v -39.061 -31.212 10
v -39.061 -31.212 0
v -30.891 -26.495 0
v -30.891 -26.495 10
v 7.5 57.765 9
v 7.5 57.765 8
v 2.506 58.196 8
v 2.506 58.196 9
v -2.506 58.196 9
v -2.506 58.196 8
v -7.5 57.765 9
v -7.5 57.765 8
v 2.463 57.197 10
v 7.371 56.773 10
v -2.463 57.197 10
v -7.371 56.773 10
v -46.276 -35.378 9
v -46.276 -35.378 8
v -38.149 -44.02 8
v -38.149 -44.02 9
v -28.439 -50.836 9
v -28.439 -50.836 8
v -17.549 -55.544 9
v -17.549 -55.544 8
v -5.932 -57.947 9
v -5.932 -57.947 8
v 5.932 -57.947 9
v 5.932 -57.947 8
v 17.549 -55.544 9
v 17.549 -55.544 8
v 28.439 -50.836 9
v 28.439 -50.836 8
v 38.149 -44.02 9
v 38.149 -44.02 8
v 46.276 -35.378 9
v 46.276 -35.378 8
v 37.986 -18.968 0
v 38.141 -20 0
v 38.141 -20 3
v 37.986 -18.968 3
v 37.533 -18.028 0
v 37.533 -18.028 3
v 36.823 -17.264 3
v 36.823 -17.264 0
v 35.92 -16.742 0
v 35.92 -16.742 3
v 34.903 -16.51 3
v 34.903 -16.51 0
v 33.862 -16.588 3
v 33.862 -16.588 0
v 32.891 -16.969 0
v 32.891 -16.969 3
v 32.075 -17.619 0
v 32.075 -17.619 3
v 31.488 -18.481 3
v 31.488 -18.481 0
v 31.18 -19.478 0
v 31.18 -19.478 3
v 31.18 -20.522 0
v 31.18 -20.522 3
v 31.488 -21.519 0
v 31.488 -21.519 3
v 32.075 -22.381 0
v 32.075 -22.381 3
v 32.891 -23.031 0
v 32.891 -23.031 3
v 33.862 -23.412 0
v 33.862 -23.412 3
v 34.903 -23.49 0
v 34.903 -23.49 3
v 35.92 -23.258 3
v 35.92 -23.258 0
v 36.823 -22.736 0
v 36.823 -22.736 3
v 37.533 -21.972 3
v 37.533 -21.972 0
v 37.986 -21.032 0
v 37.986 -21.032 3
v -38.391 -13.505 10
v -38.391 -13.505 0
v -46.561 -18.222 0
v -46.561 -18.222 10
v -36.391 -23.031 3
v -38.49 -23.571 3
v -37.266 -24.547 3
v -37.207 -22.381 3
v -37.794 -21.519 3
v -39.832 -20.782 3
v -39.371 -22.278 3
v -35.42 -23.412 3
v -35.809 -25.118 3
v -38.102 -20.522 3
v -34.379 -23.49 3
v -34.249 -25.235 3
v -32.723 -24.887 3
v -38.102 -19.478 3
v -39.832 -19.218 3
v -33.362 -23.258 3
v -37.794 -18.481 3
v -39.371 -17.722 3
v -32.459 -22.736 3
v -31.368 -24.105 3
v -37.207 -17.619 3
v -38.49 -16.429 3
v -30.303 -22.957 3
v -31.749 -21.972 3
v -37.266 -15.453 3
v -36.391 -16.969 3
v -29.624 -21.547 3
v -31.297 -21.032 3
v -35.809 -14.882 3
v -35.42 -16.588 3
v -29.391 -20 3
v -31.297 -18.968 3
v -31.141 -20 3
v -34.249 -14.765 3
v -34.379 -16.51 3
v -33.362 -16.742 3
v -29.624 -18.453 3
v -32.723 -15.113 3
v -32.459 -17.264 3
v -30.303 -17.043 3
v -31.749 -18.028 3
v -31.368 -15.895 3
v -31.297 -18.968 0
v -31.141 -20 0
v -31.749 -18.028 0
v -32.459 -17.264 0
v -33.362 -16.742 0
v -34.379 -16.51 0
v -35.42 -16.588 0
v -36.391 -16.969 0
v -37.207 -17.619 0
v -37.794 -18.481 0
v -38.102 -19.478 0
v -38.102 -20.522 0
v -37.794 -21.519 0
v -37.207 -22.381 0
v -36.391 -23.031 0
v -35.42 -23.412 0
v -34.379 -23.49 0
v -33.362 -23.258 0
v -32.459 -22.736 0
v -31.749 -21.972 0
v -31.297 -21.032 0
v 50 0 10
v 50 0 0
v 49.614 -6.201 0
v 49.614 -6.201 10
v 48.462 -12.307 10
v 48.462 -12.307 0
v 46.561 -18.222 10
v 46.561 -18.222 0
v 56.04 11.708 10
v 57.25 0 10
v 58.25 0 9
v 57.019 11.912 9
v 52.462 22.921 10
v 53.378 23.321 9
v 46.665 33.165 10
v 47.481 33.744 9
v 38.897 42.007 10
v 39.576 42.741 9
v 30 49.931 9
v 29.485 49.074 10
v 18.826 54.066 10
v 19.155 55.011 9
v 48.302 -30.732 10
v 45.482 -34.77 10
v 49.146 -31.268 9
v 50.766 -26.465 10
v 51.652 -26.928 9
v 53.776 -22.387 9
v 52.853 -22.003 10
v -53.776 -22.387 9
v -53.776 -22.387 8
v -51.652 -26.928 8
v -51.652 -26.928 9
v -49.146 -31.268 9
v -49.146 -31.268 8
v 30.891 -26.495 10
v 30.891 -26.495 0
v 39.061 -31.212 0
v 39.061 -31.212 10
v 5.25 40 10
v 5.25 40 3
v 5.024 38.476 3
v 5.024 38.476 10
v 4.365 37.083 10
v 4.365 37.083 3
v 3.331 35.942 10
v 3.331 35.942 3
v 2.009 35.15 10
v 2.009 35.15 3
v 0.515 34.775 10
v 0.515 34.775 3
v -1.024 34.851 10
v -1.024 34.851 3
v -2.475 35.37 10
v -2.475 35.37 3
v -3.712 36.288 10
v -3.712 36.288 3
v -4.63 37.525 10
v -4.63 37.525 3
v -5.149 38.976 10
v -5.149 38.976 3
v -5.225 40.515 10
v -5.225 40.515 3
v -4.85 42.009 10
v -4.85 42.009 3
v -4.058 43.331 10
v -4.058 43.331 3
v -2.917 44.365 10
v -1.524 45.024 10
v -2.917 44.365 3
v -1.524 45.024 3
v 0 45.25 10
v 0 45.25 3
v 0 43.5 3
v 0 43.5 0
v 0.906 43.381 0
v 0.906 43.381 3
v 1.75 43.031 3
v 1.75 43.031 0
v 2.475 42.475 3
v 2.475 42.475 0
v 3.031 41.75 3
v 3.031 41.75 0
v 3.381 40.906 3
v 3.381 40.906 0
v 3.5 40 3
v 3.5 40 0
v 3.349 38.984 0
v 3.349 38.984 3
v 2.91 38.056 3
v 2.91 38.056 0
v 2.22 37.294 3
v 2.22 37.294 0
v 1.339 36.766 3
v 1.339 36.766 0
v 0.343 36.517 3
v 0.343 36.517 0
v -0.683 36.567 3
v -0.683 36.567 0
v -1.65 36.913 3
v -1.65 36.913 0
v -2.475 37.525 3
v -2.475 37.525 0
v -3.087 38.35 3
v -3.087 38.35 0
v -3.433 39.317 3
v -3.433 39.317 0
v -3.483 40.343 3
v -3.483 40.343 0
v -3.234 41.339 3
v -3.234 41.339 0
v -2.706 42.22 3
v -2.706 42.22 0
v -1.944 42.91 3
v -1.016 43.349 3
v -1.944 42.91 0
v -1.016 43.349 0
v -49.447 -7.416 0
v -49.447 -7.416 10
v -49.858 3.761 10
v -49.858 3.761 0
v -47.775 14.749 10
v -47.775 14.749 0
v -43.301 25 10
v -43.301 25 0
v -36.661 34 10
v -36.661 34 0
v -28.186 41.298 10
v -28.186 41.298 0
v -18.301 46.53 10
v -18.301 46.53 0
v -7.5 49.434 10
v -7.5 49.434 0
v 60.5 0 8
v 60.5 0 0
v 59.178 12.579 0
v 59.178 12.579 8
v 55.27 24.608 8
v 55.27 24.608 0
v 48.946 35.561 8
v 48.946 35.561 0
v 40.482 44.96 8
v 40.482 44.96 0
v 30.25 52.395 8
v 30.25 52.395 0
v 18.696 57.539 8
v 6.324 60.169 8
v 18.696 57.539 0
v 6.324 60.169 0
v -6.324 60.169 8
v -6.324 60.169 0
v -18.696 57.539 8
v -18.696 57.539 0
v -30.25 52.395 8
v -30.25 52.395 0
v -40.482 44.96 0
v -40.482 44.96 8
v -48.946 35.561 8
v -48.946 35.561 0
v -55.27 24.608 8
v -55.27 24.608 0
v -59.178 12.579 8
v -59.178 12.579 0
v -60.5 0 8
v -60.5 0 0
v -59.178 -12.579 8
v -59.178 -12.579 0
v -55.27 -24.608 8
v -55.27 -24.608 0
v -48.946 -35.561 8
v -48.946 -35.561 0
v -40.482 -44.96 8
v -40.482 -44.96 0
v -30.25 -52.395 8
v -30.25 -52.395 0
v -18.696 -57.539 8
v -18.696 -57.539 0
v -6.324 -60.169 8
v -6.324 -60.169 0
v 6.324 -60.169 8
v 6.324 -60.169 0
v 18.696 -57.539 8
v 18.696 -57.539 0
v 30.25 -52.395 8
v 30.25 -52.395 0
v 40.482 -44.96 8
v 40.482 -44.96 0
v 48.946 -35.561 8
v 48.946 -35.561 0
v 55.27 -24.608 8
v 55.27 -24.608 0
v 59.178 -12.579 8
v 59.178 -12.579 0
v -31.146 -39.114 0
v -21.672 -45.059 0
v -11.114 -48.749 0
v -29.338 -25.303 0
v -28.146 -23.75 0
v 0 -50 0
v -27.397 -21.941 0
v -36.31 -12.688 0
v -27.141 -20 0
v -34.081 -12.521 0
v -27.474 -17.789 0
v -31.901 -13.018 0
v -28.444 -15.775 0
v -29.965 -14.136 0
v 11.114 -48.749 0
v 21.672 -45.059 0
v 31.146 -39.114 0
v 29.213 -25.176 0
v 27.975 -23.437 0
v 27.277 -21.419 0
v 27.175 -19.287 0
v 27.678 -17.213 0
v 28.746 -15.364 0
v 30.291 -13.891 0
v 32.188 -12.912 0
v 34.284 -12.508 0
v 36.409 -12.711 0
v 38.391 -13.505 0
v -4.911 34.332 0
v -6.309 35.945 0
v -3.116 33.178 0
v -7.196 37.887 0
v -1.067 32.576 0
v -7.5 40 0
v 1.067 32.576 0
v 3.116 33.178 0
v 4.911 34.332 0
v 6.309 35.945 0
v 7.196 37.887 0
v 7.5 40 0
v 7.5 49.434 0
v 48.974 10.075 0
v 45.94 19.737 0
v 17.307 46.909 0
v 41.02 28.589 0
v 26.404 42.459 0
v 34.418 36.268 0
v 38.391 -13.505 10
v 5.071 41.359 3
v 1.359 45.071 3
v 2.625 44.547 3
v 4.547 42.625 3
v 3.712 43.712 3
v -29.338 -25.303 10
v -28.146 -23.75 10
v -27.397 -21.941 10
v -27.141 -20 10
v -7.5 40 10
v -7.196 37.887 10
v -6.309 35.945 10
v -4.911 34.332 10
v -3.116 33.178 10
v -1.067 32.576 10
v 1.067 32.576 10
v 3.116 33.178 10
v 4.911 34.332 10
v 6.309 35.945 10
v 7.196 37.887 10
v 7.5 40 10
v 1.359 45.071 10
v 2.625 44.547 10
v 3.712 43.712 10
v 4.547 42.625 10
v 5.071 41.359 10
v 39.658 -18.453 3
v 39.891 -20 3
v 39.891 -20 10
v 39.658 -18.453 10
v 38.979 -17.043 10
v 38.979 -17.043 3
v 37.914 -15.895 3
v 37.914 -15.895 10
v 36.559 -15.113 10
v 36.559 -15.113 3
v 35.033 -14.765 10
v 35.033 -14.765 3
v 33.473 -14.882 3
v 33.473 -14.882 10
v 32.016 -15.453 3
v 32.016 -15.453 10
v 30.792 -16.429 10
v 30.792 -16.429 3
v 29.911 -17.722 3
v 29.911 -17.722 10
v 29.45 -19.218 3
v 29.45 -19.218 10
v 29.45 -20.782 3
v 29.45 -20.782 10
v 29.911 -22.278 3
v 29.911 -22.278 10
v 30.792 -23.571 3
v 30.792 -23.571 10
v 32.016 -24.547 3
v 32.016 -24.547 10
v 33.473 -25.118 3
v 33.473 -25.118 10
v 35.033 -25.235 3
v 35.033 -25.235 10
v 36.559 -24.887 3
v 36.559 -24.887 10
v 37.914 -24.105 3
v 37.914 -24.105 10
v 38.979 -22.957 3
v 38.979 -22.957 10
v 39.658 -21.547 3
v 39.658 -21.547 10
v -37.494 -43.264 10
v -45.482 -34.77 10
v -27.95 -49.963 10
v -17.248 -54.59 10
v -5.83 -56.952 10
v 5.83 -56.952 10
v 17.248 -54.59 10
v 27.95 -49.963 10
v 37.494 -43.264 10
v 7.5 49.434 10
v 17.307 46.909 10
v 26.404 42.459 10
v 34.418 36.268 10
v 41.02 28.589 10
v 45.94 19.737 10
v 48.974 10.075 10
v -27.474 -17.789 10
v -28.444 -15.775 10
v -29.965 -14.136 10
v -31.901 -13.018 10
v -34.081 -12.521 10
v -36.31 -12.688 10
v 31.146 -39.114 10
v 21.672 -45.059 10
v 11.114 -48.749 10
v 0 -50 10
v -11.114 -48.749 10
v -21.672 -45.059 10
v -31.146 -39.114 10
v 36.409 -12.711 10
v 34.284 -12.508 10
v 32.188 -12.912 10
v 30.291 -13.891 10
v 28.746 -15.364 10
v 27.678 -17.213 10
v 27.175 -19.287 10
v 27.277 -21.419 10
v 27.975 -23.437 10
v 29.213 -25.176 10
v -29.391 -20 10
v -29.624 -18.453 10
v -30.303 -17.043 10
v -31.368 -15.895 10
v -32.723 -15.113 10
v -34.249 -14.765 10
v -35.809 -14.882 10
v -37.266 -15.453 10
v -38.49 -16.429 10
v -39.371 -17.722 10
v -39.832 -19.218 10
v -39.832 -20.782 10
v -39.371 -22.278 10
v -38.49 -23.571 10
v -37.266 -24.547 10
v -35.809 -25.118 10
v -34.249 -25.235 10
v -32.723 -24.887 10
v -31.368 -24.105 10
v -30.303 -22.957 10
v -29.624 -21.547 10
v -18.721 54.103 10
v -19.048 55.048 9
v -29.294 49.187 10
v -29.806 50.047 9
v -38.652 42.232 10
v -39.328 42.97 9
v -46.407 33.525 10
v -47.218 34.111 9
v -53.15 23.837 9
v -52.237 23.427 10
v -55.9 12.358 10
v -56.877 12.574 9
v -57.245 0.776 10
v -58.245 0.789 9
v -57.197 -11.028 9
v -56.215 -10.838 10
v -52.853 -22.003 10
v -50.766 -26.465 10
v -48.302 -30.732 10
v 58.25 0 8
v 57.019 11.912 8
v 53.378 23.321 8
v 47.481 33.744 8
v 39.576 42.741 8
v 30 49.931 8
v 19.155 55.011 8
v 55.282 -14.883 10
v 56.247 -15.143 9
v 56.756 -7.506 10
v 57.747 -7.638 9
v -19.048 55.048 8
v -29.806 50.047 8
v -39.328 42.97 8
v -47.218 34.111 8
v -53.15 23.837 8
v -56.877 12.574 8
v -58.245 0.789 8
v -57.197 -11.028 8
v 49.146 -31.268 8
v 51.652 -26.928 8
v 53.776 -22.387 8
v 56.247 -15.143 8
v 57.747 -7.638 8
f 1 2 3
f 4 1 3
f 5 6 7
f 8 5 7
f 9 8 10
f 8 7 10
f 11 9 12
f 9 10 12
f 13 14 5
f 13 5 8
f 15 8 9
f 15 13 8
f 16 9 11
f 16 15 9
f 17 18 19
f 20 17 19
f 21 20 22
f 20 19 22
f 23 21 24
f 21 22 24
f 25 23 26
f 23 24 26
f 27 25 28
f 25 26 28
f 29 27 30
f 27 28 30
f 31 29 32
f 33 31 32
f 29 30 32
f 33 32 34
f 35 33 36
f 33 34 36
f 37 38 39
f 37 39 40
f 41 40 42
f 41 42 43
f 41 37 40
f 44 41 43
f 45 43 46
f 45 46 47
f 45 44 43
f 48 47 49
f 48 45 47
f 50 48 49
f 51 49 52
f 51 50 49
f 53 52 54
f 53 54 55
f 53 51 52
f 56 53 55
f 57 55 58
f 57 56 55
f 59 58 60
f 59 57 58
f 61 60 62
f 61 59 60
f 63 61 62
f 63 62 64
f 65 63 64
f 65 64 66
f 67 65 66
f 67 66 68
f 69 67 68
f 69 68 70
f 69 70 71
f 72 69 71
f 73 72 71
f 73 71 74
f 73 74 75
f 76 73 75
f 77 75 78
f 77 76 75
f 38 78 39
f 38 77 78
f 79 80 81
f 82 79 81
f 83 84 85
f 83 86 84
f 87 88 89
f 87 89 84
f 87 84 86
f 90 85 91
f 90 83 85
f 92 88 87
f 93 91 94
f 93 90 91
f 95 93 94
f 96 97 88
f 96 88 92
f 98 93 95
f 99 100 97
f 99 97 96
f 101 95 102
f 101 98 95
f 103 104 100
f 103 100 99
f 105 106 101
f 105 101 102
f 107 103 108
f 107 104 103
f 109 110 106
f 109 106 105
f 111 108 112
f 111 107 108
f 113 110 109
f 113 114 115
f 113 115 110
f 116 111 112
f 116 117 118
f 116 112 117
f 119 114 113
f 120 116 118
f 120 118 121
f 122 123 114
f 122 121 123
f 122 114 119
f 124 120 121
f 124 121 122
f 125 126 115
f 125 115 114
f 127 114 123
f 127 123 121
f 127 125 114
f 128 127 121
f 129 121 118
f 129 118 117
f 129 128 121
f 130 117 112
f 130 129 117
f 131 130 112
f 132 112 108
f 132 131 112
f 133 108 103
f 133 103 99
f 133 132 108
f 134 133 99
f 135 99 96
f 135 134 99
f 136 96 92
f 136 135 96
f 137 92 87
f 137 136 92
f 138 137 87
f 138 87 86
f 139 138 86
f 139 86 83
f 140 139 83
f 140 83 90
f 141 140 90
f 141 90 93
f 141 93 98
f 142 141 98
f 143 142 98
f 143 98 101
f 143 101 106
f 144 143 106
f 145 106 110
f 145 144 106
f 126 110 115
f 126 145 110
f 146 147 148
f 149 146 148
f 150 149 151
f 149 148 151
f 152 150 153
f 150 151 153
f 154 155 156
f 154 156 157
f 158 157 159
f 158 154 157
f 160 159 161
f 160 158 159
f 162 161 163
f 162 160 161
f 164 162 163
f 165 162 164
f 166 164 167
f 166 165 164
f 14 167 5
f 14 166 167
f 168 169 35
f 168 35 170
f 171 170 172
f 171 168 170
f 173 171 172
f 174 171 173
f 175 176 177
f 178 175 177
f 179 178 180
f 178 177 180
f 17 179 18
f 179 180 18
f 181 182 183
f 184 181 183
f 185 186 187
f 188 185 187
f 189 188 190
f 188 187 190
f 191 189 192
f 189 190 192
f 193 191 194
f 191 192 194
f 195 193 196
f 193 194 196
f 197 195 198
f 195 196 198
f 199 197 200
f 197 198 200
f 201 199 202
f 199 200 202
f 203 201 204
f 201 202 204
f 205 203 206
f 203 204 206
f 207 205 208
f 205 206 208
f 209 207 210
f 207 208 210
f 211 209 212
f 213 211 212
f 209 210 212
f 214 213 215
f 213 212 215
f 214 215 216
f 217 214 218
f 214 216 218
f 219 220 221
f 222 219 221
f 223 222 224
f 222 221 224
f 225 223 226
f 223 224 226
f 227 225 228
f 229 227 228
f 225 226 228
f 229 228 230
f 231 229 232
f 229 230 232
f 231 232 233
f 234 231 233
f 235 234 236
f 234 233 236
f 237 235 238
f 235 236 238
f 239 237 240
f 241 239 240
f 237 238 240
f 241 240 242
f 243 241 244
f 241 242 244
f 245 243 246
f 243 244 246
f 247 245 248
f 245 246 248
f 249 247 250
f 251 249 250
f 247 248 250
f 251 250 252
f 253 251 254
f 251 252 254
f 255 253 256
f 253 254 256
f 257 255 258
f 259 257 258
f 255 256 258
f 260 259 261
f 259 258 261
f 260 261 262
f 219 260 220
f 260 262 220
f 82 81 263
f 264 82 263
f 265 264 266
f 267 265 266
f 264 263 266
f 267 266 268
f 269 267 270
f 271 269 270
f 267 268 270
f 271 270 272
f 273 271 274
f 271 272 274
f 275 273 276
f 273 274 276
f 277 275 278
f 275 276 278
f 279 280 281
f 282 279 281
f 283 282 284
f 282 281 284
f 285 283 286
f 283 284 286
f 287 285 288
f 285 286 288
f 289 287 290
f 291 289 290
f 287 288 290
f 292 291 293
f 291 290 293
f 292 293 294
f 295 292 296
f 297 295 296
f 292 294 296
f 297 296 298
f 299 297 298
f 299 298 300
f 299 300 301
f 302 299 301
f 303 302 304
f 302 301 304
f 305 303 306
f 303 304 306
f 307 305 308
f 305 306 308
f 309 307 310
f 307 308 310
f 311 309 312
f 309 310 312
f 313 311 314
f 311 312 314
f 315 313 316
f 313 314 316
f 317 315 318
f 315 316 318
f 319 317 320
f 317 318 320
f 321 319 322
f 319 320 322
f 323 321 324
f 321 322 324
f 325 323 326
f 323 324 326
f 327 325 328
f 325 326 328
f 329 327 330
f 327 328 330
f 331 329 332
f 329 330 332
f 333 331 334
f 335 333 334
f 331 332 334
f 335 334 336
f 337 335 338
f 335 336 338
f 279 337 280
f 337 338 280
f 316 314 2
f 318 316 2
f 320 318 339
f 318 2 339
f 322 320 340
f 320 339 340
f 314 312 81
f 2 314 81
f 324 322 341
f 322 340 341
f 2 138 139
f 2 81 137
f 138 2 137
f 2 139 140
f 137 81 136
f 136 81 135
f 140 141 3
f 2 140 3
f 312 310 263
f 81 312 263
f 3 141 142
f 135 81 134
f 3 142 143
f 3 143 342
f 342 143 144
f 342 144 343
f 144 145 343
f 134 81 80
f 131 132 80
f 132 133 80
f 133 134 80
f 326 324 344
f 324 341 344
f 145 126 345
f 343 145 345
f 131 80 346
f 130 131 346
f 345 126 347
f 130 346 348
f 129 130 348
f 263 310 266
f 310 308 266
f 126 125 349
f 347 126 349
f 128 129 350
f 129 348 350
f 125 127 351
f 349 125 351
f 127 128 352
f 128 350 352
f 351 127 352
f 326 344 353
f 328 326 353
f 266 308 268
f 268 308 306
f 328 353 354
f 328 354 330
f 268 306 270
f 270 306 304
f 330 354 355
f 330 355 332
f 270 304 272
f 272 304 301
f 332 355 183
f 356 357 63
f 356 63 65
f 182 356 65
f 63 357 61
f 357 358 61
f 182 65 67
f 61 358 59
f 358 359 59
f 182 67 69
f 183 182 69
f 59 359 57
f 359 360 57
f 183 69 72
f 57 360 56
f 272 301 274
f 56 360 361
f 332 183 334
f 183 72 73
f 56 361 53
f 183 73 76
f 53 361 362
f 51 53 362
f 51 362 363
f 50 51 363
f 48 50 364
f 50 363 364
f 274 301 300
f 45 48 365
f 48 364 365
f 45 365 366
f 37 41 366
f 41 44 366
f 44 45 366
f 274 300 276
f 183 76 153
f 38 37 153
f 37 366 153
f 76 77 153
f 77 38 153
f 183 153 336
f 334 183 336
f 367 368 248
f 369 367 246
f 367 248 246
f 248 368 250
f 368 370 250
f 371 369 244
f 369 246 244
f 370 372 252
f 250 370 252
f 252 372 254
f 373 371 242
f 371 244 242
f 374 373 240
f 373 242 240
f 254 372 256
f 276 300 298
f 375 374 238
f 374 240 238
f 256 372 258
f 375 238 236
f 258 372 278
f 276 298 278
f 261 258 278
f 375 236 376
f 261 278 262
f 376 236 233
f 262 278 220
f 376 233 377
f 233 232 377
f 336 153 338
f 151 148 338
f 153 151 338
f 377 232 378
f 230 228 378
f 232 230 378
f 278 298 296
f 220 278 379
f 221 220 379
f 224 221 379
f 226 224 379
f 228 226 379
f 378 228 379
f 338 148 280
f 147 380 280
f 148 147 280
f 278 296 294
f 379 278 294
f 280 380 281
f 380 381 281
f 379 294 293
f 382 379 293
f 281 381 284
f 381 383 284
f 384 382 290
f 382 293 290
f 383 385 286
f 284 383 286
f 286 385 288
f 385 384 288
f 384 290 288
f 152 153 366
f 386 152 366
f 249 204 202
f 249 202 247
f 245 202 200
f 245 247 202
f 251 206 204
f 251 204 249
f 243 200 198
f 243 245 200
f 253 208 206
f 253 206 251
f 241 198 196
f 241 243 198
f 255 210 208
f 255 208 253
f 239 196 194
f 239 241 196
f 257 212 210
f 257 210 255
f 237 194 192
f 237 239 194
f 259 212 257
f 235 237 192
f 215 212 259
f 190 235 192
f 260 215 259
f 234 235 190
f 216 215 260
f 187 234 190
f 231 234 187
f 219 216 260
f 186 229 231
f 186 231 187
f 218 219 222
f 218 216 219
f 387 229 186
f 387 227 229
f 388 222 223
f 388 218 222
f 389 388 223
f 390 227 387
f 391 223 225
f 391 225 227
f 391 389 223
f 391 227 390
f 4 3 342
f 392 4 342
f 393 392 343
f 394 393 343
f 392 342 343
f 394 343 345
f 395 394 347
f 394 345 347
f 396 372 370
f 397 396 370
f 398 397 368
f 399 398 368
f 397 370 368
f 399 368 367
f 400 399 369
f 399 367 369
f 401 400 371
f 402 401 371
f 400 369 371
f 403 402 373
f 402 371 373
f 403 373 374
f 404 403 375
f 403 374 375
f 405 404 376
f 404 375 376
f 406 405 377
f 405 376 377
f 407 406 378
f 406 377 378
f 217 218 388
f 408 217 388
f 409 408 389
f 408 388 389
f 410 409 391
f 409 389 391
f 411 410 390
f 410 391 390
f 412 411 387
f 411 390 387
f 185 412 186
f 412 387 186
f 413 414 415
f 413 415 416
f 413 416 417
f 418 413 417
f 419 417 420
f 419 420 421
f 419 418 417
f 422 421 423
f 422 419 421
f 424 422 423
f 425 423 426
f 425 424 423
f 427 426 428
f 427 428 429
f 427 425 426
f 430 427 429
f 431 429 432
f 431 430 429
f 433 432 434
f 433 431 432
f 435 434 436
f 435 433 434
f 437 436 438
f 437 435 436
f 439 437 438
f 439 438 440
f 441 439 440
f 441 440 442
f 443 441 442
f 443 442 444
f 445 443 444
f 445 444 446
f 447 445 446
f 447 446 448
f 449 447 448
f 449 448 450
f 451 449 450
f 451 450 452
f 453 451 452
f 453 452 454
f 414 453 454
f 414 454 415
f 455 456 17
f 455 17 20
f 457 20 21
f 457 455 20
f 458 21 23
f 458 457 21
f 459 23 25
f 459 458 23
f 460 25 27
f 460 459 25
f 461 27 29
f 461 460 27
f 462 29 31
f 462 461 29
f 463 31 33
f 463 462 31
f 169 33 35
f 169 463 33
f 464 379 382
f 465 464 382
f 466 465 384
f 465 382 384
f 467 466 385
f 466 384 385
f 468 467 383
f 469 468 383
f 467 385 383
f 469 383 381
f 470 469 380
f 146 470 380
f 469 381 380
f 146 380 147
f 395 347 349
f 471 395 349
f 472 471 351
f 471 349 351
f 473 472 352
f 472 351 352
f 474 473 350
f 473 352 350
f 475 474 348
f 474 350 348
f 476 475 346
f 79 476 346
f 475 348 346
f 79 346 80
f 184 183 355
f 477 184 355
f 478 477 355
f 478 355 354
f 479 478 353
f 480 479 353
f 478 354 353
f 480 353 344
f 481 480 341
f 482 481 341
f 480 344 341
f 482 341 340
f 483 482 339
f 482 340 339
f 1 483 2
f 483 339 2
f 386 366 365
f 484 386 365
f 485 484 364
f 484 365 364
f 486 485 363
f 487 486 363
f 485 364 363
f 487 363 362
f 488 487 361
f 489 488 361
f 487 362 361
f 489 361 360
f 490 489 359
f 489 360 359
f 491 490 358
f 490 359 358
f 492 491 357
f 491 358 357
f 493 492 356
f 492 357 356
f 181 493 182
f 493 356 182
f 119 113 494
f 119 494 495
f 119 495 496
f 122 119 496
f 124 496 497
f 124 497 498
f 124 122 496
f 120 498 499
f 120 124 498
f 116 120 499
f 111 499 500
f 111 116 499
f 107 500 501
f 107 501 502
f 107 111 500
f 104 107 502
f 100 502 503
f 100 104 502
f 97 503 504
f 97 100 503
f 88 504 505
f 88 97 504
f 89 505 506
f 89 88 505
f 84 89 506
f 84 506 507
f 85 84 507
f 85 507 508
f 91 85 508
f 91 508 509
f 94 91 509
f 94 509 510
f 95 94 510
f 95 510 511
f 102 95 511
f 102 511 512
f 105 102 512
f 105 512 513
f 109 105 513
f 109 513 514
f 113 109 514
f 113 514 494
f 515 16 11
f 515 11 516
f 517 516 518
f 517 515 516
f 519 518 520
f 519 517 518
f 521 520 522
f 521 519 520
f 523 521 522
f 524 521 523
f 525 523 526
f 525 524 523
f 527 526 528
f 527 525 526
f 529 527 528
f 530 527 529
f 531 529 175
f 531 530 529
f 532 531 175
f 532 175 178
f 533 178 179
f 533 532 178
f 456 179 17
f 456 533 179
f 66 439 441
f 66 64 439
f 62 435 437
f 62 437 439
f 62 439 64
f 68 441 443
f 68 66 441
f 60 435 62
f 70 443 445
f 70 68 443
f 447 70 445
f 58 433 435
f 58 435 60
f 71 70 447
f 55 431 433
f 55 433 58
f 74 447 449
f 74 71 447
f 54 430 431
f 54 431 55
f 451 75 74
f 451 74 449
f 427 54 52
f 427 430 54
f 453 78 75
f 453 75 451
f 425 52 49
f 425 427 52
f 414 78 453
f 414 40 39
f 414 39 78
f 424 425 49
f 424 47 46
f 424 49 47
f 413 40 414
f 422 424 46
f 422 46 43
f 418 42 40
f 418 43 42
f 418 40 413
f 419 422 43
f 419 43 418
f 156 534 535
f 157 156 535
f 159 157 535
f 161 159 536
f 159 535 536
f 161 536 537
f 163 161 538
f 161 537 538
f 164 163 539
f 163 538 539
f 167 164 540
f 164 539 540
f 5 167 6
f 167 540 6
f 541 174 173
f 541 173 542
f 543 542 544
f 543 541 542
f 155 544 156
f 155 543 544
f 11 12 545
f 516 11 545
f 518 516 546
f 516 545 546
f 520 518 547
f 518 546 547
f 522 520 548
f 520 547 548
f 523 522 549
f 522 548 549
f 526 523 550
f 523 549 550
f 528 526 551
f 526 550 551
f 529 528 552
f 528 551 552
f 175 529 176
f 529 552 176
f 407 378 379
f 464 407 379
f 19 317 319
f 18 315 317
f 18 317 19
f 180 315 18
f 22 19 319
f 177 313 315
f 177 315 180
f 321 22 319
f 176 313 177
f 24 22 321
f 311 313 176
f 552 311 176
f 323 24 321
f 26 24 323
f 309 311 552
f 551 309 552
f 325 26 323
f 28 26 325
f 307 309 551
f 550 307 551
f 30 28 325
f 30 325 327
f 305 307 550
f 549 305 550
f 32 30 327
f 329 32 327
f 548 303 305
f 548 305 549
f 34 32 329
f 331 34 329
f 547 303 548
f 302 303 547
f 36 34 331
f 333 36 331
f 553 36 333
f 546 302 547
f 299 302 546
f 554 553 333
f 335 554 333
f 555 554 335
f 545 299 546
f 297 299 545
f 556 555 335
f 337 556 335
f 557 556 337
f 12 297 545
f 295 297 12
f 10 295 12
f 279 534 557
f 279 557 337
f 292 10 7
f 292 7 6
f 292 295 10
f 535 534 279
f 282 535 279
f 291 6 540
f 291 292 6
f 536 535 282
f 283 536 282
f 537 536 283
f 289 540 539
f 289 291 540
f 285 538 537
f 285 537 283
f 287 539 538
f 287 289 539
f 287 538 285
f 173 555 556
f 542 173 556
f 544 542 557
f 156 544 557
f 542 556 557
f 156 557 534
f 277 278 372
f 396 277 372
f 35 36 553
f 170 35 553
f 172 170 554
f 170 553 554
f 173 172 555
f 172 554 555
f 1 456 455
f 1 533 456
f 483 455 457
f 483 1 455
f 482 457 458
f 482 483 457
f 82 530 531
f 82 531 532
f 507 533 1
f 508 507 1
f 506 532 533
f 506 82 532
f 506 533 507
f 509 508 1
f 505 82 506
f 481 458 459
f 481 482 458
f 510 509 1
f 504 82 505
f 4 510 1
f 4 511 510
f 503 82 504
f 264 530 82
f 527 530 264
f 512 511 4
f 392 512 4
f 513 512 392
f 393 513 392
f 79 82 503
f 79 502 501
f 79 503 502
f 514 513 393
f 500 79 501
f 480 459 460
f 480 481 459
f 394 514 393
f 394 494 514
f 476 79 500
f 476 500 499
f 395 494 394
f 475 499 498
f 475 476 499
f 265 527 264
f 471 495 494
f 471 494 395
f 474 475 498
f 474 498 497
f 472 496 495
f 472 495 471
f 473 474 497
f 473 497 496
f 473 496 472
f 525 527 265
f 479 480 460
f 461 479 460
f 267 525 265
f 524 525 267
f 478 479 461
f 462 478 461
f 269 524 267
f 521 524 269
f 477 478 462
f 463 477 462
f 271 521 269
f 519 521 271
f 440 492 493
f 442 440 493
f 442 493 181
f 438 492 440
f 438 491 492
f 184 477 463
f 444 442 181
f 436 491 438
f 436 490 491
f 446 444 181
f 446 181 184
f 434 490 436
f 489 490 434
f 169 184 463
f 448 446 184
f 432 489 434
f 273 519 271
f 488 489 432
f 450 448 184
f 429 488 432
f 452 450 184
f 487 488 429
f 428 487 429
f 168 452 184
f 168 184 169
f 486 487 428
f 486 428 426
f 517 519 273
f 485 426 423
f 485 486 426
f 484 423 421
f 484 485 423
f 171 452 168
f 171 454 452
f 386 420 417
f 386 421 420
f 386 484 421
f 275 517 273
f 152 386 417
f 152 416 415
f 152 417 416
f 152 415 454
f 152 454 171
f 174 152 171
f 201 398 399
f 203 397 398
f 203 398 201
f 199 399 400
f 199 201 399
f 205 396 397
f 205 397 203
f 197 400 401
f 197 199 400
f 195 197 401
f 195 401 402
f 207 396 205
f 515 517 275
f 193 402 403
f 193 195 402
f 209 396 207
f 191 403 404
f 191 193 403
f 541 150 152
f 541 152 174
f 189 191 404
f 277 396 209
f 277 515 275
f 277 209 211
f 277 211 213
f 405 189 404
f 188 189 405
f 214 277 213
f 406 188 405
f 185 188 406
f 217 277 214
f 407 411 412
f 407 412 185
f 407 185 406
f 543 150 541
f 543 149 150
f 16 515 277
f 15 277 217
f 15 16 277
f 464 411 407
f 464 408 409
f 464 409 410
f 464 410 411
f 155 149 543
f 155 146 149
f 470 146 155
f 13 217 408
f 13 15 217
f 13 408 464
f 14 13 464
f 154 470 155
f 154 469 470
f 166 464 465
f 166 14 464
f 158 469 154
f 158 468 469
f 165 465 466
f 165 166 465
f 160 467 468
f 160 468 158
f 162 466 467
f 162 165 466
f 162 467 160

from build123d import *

# Parameters (mm, degrees)
F0_R     = 5.25
F1_DEPTH = 10
F0_R_2   = 60.5
F2_DEPTH = 8
F3_SIZE  = 1
F0_R_3   = 3.5
F4_DEPTH = 3


with BuildPart() as f1:
    # F0 (on Top) → F1 (new body)
    with BuildSketch(Plane.XY):
        with BuildLine():
            ThreePointArc((7.5, 49.4342998332), (37.9143772203, 32.596012026), (50, 0))
            ThreePointArc((50, 0), (49.1328198544, -9.2717858665), (46.5613594739, -18.2219593882))
            Line((46.5613594739, -18.2219593882), (53.7760869447, -22.3873842357))
            ThreePointArc((53.7760869447, -22.3873842357), (57.1205723209, -11.4150215828), (58.25, 0))
            ThreePointArc((58.25, 0), (43.7603559172, 38.4459848359), (7.5, 57.7651495281))
            Line((7.5, 57.7651495281), (7.5, 49.4342998332))
        make_face()
        with BuildLine():
            ThreePointArc((0, 50), (3.7606520937, 49.8583743801), (7.5, 49.4342998332))
            Line((7.5, 49.4342998332), (7.5, 57.7651495281))
            Line((7.5, 57.7651495281), (-7.5, 57.7651495281))
            Line((-7.5, 57.7651495281), (-7.5, 49.4342998332))
            ThreePointArc((-7.5, 49.4342998332), (-3.7606520937, 49.8583743801), (0, 50))
        make_face()
        with BuildLine():
            ThreePointArc((-46.5613594739, -18.2219593882), (-43.3012701892, 25), (-7.5, 49.4342998332))
            Line((-7.5, 49.4342998332), (-7.5, 57.7651495281))
            ThreePointArc((-7.5, 57.7651495281), (-50.4459797704, 29.125), (-53.7760869447, -22.3873842357))
            Line((-53.7760869447, -22.3873842357), (-46.5613594739, -18.2219593882))
        make_face()
        with BuildLine():
            Line((-46.2760869447, -35.3777652924), (-39.0613594739, -31.212340445))
            ThreePointArc((-39.0613594739, -31.212340445), (-43.3012701892, -25), (-46.5613594739, -18.2219593882))
            Line((-46.5613594739, -18.2219593882), (-53.7760869447, -22.3873842357))
            ThreePointArc((-53.7760869447, -22.3873842357), (-50.4459797704, -29.125), (-46.2760869447, -35.3777652924))
        make_face()
        with BuildLine():
            Line((46.2760869447, -35.3777652924), (39.0613594739, -31.212340445))
            ThreePointArc((39.0613594739, -31.212340445), (0, -50), (-39.0613594739, -31.212340445))
            Line((-39.0613594739, -31.212340445), (-46.2760869447, -35.3777652924))
            ThreePointArc((-46.2760869447, -35.3777652924), (0, -58.25), (46.2760869447, -35.3777652924))
        make_face()
        with BuildLine():
            Line((53.7760869447, -22.3873842357), (46.5613594739, -18.2219593882))
            ThreePointArc((46.5613594739, -18.2219593882), (43.3012701892, -25), (39.0613594739, -31.212340445))
            Line((39.0613594739, -31.212340445), (46.2760869447, -35.3777652924))
            ThreePointArc((46.2760869447, -35.3777652924), (50.4459797704, -29.125), (53.7760869447, -22.3873842357))
        make_face()
        with BuildLine():
            Line((-7.5, 57.7651495281), (7.5, 57.7651495281))
            ThreePointArc((7.5, 57.7651495281), (0, 58.25), (-7.5, 57.7651495281))
        make_face()
        with BuildLine():
            Line((7.5, 40), (7.5, 49.4342998332))
            ThreePointArc((7.5, 49.4342998332), (3.7606520937, 49.8583743801), (0, 50))
            Line((0, 50), (0, 47.5))
            ThreePointArc((0, 47.5), (5.3033008589, 45.3033008589), (7.5, 40))
        make_face()
        with BuildLine():
            Line((0, 47.5), (0, 50))
            ThreePointArc((0, 50), (-3.7606520937, 49.8583743801), (-7.5, 49.4342998332))
            Line((-7.5, 49.4342998332), (-7.5, 40))
            ThreePointArc((-7.5, 40), (-5.3033008589, 45.3033008589), (0, 47.5))
        make_face()
        with BuildLine():
            ThreePointArc((-7.5, 40), (0, 32.5), (7.5, 40))
            ThreePointArc((7.5, 40), (5.3033008589, 45.3033008589), (0, 47.5))
            ThreePointArc((0, 47.5), (-5.3033008589, 45.3033008589), (-7.5, 40))
        make_face()
        with BuildLine():
            ThreePointArc((5.25, 40), (-3.7123106012, 36.2876893988), (0, 45.25))
            ThreePointArc((0, 45.25), (3.7123106012, 43.7123106012), (5.25, 40))
        make_face(mode=Mode.SUBTRACT)
        with BuildLine():
            ThreePointArc((39.0613594739, -31.212340445), (43.3012701892, -25), (46.5613594739, -18.2219593882))
            Line((46.5613594739, -18.2219593882), (38.3910161948, -13.5048094967))
            ThreePointArc((38.3910161948, -13.5048094967), (41.1362066923, -16.2500000217), (42.1410161514, -20))
            ThreePointArc((42.1410161514, -20), (38.3910161049, -26.4951905552), (30.8910160584, -26.4951904747))
            Line((30.8910160584, -26.4951904747), (39.0613594739, -31.212340445))
        make_face()
        with BuildLine():
            ThreePointArc((42.1410161514, -20), (41.1362066923, -16.2500000217), (38.3910161948, -13.5048094967))
            ThreePointArc((38.3910161948, -13.5048094967), (28.1458256624, -16.2499999318), (30.8910160584, -26.4951904747))
            ThreePointArc((30.8910160584, -26.4951904747), (38.3910161049, -26.4951905552), (42.1410161514, -20))
        make_face()
        with Locations((34.6410161514, -20)):
            Circle(F0_R, mode=Mode.SUBTRACT)
        with BuildLine():
            ThreePointArc((-38.3910159202, -13.5048093381), (-41.1362067455, -23.7499998861), (-30.891016148, -26.4951905264))
            ThreePointArc((-30.891016148, -26.4951905264), (-28.145825622, -23.7499999983), (-27.1410161514, -20))
            ThreePointArc((-27.1410161514, -20), (-30.8910160358, -13.5048095384), (-38.3910159202, -13.5048093381))
        make_face()
        with Locations((-34.6410161514, -20)):
            Circle(F0_R, mode=Mode.SUBTRACT)
        with BuildLine():
            ThreePointArc((-46.5613594739, -18.2219593882), (-43.3012701892, -25), (-39.0613594739, -31.212340445))
            Line((-39.0613594739, -31.212340445), (-30.891016148, -26.4951905264))
            ThreePointArc((-30.891016148, -26.4951905264), (-41.1362067455, -23.7499998861), (-38.3910159202, -13.5048093381))
            Line((-38.3910159202, -13.5048093381), (-46.5613594739, -18.2219593882))
        make_face()
    extrude(amount=F1_DEPTH)

    # F0 (on Top) → F2 (join)
    with BuildSketch(Plane.XY):
        Circle(F0_R_2)
        with BuildLine():
            ThreePointArc((-7.5, 57.7651495281), (0, 58.25), (7.5, 57.7651495281))
            ThreePointArc((7.5, 57.7651495281), (43.7603559172, 38.4459848359), (58.25, 0))
            ThreePointArc((58.25, 0), (57.1205723209, -11.4150215828), (53.7760869447, -22.3873842357))
            ThreePointArc((53.7760869447, -22.3873842357), (50.4459797704, -29.125), (46.2760869447, -35.3777652924))
            ThreePointArc((46.2760869447, -35.3777652924), (0, -58.25), (-46.2760869447, -35.3777652924))
            ThreePointArc((-46.2760869447, -35.3777652924), (-50.4459797704, -29.125), (-53.7760869447, -22.3873842357))
            ThreePointArc((-53.7760869447, -22.3873842357), (-50.4459797704, 29.125), (-7.5, 57.7651495281))
        make_face(mode=Mode.SUBTRACT)
    extrude(amount=F2_DEPTH)

    # F3
    f3_edges = [f1.edges().sort_by_distance(p)[0] for p in [
        (-7.5, -57.76515, 10),
    ]]
    chamfer(f3_edges, length=F3_SIZE)

    # F0 (on Top) → F4 (join)
    with BuildSketch(Plane.XY):
        with BuildLine():
            ThreePointArc((5.25, 40), (3.7123106012, 43.7123106012), (0, 45.25))
            ThreePointArc((0, 45.25), (-3.7123106012, 36.2876893988), (5.25, 40))
        make_face()
        with BuildLine():
            ThreePointArc((3.5, 40), (-2.4748737342, 37.5251262658), (0, 43.5))
            ThreePointArc((0, 43.5), (2.4748737342, 42.4748737342), (3.5, 40))
        make_face(mode=Mode.SUBTRACT)
        with Locations((-34.6410161514, -20)):
            Circle(F0_R)
        with Locations((-34.6410161514, -20)):
            Circle(F0_R_3, mode=Mode.SUBTRACT)
        with Locations((34.6410161514, -20)):
            Circle(F0_R)
        with Locations((34.6410161514, -20)):
            Circle(F0_R_3, mode=Mode.SUBTRACT)
    extrude(amount=F4_DEPTH)


solid = f1.part
